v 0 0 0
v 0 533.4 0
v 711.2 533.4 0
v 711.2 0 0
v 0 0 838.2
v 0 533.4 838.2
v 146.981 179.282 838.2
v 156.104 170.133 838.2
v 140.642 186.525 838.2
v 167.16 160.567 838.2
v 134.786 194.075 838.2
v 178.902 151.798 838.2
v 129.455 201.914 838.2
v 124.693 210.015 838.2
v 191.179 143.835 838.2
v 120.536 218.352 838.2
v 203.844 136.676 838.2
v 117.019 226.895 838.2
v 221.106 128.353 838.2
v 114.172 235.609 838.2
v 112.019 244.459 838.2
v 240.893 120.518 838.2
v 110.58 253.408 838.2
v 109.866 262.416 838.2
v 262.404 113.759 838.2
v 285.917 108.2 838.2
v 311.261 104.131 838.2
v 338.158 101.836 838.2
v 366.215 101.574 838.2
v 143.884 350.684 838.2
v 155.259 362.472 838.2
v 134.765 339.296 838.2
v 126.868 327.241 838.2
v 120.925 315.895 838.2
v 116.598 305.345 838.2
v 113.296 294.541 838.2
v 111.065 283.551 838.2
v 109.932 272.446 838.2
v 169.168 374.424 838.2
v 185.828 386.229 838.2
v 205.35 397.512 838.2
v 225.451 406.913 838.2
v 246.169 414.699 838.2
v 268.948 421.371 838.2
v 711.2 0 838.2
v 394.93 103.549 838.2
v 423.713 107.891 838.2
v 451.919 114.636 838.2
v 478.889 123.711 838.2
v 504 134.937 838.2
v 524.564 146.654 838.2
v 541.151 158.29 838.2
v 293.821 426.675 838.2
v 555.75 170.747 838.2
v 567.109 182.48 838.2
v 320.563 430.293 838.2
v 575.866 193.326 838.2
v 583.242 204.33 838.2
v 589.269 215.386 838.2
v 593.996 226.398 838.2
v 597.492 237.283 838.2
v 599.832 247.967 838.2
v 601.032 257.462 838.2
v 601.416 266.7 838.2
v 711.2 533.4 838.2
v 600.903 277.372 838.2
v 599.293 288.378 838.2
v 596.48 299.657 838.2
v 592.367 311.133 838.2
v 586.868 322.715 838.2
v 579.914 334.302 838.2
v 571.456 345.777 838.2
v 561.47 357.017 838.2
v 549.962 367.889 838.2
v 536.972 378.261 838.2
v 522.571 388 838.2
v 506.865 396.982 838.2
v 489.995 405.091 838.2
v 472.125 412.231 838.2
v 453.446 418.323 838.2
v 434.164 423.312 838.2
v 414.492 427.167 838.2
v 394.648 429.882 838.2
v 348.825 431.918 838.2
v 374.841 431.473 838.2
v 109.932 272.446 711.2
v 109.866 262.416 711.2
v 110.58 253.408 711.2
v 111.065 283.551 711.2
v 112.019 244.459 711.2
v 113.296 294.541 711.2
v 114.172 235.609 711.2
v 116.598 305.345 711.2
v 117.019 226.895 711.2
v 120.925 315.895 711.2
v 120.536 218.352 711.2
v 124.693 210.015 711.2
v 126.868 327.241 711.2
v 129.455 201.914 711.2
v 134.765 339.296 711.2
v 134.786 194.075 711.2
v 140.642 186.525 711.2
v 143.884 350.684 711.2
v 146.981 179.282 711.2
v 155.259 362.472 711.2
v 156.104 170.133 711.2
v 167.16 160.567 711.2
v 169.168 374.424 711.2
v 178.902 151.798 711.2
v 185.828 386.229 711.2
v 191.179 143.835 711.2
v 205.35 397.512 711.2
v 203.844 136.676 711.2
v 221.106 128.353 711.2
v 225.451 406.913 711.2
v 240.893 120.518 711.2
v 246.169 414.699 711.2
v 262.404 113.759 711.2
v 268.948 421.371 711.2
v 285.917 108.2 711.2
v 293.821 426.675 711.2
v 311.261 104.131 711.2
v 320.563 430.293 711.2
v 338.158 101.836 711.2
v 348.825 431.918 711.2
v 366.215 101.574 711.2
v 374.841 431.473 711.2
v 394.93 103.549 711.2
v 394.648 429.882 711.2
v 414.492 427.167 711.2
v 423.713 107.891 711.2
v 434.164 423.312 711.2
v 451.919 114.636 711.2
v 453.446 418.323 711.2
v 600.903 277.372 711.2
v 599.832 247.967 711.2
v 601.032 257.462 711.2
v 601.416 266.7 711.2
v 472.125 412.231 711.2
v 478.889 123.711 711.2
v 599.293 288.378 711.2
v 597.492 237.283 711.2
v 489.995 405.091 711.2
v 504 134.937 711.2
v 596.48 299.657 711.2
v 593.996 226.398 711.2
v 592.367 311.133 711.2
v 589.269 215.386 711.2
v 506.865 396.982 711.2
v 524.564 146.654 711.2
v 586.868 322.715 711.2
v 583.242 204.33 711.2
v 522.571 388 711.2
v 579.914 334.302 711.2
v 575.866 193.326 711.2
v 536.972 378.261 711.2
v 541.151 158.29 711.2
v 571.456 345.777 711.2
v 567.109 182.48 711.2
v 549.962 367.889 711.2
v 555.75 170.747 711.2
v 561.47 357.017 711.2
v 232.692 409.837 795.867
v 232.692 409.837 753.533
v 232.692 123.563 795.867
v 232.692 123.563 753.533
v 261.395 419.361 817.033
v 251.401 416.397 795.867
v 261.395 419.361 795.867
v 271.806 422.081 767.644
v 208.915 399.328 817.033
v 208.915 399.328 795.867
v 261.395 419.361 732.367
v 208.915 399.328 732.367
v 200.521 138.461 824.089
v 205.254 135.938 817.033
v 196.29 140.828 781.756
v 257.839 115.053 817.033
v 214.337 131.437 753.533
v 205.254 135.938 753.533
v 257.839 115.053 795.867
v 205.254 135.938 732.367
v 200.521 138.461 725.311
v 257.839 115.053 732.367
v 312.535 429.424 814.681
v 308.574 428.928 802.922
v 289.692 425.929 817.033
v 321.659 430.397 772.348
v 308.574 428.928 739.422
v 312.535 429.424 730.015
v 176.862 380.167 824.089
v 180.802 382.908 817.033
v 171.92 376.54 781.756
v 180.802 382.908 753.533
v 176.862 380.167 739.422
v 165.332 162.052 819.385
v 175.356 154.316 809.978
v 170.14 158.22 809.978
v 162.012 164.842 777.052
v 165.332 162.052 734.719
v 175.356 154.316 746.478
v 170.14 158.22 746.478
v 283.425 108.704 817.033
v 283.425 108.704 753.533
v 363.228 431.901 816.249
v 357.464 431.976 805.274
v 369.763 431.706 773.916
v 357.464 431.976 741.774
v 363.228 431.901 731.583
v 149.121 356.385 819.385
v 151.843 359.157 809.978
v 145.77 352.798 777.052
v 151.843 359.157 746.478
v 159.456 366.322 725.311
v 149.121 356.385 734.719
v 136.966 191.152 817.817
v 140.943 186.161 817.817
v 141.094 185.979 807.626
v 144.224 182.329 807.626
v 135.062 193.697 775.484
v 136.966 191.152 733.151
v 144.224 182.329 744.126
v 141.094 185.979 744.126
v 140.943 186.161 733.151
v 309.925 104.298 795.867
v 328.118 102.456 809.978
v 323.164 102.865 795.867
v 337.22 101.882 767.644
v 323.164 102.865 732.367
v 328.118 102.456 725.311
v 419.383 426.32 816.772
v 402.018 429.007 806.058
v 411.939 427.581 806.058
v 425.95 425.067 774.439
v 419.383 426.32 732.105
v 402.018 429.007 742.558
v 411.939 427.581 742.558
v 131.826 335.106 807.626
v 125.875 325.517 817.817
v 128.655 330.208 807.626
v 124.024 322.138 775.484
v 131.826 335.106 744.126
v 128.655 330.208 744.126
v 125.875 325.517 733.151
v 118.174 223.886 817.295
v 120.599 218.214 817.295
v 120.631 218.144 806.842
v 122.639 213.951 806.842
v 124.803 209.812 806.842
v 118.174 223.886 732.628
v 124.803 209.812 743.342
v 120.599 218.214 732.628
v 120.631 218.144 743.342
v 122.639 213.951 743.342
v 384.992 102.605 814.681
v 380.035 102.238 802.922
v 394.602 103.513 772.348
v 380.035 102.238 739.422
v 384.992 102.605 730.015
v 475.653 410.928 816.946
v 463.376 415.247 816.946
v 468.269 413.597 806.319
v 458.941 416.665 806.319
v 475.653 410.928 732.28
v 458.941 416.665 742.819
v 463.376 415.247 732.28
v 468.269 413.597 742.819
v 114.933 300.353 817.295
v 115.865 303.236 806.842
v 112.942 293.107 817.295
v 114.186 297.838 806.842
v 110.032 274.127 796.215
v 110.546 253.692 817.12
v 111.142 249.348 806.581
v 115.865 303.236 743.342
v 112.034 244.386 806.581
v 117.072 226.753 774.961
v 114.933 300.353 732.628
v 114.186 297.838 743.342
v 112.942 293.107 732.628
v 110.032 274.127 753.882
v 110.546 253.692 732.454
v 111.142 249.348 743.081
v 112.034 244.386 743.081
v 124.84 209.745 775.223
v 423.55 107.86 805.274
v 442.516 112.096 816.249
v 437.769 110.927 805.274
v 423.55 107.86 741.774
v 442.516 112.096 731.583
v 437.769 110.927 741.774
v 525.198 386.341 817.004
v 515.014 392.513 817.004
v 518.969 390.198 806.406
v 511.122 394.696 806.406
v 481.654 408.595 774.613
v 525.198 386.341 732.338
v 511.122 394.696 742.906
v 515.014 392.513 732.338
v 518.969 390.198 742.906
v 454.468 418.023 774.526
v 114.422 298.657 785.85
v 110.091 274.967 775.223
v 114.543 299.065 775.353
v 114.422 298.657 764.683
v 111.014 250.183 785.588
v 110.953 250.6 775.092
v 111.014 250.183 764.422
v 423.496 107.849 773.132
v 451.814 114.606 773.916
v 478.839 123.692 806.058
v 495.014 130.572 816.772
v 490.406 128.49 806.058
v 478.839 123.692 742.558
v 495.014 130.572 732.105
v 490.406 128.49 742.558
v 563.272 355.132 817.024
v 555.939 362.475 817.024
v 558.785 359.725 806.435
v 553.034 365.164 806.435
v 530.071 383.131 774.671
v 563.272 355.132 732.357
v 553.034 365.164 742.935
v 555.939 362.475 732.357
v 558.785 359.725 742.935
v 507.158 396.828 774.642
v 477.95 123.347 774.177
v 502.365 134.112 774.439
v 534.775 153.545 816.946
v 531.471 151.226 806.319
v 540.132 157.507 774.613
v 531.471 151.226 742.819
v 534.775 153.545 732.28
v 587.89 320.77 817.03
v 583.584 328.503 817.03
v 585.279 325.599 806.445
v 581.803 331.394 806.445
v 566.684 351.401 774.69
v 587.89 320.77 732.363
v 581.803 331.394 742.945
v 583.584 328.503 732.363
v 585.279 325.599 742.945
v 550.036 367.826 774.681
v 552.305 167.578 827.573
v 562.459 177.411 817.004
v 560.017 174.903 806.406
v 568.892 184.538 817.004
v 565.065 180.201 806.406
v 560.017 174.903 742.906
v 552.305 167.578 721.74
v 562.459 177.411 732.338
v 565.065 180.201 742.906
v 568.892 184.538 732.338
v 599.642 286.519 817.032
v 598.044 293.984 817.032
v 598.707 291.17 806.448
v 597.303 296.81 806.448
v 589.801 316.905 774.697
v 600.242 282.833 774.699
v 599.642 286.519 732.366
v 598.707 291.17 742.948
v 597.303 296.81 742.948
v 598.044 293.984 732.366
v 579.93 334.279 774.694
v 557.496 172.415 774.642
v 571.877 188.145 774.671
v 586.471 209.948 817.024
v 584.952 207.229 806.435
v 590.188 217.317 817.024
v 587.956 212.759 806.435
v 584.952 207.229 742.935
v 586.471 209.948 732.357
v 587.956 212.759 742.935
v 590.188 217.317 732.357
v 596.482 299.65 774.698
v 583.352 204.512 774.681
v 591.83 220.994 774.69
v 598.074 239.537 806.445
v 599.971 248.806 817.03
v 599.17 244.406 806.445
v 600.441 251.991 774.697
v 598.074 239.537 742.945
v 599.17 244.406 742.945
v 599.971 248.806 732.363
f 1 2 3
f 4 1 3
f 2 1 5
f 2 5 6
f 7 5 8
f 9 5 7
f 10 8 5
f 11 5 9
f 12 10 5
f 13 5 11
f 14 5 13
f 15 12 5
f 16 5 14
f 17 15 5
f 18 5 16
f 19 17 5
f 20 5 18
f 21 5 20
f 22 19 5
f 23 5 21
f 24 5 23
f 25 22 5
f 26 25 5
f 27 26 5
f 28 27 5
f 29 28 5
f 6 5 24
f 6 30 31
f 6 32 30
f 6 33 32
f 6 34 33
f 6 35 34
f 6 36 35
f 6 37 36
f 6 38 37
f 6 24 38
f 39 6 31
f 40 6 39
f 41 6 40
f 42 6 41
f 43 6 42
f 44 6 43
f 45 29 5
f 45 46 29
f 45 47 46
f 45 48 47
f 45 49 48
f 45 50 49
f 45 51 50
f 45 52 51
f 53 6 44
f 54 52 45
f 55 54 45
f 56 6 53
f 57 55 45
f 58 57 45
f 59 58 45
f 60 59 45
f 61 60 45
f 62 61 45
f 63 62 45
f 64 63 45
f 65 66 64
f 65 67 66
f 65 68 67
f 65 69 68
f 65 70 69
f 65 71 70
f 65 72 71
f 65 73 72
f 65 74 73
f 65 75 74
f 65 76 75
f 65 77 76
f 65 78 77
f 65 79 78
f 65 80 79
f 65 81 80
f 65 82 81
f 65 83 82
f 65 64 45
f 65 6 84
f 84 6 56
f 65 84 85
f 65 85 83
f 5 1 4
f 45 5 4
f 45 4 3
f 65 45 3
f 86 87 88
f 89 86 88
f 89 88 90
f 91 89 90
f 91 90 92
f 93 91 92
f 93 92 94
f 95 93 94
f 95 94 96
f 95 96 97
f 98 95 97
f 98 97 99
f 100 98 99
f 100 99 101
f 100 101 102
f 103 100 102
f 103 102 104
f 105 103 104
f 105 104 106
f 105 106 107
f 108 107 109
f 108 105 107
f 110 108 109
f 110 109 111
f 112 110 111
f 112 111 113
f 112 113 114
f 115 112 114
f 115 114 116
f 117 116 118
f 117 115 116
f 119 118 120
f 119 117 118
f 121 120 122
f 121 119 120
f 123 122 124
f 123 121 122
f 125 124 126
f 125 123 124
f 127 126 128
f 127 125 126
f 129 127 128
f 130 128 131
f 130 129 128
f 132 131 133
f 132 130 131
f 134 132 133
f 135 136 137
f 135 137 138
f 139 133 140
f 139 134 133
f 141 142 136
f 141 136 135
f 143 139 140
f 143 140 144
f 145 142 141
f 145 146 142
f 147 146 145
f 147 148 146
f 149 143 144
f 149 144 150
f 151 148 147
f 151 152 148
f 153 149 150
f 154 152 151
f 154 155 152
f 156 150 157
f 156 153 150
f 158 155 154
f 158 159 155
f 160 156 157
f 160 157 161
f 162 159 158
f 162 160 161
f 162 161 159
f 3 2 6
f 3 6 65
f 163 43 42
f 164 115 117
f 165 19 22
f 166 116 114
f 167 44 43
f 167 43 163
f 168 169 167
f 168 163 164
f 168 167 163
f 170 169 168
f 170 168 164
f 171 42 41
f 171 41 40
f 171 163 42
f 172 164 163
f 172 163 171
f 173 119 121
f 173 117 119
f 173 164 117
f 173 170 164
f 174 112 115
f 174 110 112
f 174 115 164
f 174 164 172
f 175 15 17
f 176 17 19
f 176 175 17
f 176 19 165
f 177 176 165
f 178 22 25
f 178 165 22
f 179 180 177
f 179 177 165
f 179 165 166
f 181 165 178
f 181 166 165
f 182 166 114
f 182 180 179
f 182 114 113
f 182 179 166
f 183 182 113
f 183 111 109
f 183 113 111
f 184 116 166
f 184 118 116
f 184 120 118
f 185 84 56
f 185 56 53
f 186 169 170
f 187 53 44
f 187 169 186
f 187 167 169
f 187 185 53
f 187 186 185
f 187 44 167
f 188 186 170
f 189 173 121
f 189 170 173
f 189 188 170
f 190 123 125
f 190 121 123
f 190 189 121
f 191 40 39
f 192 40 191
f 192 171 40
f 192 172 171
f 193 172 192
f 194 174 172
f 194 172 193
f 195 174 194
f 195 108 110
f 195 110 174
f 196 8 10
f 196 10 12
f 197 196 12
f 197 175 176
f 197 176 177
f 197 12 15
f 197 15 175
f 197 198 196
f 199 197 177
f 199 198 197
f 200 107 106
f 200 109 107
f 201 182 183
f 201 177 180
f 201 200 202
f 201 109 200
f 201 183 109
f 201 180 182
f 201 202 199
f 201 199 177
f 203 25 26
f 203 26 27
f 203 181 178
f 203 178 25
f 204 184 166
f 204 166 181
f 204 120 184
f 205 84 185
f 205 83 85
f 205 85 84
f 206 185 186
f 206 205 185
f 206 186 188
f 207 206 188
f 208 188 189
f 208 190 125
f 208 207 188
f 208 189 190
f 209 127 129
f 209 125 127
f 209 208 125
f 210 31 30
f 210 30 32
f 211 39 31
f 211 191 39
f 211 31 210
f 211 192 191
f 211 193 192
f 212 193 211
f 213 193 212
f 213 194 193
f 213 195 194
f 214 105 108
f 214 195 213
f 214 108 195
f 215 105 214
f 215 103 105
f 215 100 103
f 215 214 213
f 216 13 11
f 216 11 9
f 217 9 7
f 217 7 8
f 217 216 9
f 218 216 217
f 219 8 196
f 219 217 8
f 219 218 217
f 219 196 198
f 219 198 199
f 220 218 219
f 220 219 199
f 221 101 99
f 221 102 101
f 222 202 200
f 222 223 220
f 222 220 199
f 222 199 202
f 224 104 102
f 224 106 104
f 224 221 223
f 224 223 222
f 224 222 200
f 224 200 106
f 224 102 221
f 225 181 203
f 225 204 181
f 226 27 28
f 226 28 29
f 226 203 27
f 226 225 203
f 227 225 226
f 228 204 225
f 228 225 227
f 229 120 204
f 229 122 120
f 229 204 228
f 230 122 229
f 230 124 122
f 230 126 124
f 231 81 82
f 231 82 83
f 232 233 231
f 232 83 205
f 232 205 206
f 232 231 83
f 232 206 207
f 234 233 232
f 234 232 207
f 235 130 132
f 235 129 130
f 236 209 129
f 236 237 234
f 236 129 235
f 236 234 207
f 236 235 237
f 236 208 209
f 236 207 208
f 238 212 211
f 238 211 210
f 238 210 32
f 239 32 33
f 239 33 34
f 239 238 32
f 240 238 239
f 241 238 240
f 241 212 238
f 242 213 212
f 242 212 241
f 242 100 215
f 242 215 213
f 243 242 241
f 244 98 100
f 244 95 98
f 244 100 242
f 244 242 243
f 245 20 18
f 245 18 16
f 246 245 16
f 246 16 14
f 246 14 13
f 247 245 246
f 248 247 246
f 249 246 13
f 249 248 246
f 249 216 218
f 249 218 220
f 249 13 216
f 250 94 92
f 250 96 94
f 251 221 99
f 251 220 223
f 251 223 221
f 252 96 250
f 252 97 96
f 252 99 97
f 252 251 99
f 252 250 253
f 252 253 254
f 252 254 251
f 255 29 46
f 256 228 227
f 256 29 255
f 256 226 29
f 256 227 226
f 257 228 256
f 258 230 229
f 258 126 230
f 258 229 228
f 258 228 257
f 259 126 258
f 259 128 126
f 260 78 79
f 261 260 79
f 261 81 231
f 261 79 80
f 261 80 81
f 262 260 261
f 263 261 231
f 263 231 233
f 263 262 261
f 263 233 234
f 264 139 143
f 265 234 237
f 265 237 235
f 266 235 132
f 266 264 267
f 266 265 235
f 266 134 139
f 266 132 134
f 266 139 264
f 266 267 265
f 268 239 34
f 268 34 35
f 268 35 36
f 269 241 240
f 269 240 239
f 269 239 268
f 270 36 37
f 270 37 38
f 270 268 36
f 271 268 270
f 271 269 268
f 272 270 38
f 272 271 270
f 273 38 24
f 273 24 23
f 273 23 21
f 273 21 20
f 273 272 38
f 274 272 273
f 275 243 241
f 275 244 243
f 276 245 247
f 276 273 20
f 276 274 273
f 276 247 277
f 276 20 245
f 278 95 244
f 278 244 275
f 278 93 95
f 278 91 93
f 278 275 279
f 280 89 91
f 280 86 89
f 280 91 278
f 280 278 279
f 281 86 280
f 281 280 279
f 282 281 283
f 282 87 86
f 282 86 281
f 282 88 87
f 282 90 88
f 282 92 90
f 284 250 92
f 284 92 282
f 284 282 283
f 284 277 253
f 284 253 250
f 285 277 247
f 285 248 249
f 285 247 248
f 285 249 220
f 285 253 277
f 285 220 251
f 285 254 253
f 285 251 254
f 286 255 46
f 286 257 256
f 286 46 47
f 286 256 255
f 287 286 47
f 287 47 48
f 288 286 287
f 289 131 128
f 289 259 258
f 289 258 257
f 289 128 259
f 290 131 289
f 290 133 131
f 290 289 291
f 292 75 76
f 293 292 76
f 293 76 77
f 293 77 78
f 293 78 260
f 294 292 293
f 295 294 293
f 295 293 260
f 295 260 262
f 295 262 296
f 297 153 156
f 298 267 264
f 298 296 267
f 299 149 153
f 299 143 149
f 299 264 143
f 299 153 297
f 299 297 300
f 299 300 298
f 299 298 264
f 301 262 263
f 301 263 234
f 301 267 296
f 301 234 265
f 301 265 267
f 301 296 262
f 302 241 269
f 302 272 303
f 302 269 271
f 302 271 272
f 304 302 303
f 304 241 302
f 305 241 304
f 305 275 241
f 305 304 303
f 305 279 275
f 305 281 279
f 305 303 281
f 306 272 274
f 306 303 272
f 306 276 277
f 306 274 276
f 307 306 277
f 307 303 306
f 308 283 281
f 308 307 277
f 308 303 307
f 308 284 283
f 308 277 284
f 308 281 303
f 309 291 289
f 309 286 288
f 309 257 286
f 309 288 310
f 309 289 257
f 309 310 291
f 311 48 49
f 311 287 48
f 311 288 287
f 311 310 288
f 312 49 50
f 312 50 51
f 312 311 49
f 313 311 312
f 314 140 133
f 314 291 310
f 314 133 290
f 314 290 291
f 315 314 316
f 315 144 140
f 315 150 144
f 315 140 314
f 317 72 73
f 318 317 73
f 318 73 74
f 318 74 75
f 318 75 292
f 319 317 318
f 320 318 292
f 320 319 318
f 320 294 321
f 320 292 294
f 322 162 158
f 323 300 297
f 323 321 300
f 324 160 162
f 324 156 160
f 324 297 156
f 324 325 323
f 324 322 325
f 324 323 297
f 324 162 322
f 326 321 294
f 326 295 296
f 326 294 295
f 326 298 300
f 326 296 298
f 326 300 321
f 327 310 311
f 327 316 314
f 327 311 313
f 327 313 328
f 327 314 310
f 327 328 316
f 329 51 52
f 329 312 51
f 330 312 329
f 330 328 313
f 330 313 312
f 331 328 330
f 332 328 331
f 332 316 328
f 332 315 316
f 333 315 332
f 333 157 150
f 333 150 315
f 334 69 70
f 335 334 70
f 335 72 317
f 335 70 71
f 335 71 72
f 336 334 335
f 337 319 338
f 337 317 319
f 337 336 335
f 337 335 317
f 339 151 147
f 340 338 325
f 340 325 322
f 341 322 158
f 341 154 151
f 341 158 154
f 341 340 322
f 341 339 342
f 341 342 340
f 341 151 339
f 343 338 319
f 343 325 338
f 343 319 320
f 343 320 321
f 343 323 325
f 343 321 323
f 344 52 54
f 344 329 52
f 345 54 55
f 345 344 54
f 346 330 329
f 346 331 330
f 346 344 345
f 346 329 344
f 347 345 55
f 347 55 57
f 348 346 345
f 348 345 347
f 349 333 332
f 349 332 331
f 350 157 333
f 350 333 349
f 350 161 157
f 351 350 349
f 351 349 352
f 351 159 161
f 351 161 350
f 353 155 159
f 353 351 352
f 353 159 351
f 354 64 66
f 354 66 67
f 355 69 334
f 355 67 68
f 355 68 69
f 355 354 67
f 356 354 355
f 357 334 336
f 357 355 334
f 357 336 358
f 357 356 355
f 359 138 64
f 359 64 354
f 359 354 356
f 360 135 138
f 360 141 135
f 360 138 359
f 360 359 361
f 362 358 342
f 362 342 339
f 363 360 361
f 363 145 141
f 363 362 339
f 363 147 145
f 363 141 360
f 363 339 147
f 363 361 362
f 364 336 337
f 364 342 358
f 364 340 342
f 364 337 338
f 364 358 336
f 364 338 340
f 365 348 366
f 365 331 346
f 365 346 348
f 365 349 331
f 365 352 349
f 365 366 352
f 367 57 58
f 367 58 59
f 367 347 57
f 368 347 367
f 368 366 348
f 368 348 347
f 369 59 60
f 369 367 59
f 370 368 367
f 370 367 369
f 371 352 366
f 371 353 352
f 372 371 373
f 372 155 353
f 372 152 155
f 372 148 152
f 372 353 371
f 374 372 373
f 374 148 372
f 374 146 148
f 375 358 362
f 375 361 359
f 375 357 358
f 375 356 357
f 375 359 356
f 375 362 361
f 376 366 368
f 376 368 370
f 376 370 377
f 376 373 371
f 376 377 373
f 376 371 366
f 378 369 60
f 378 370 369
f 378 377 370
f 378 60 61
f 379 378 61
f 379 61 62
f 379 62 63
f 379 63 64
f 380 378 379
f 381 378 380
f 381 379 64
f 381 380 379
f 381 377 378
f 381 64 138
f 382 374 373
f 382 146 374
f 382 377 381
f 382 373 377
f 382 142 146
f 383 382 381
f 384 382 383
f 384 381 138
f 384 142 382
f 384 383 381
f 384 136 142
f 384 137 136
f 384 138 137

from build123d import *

# Parameters (mm, degrees)
F0_W     = 711.2
F0_H     = 533.4
F1_DEPTH = 838.2
F2_DEPTH = 711.2


with BuildPart() as f1:
    # F0 (on Top) → F1 (new body)
    with BuildSketch(Plane.XY):
        with Locations((355.6, 266.7)):
            Rectangle(F0_W, F0_H)
        with BuildLine():
            add(Edge.make_bspline(
                [(601.416213, 266.7), (601.416213, 552.973976), (232.691893, 409.836988), (-136.032426, 266.7), (232.691893, 123.563012), (601.416213, -19.573976), (601.416213, 266.7)],
                knots=[0, 0, 0, 2.094395, 2.094395, 4.18879, 4.18879, 6.283185, 6.283185, 6.283185], degree=2, weights=[1, 0.5, 1, 0.5, 1, 0.5, 1]))
        make_face(mode=Mode.SUBTRACT)
    extrude(amount=F1_DEPTH)

    # F0 (on Top) → F2 (join)
    with BuildSketch(Plane.XY):
        with BuildLine():
            add(Edge.make_bspline(
                [(601.416213, 266.7), (601.416213, 552.973976), (232.691893, 409.836988), (-136.032426, 266.7), (232.691893, 123.563012), (601.416213, -19.573976), (601.416213, 266.7)],
                knots=[0, 0, 0, 2.094395, 2.094395, 4.18879, 4.18879, 6.283185, 6.283185, 6.283185], degree=2, weights=[1, 0.5, 1, 0.5, 1, 0.5, 1]))
        make_face()
    extrude(amount=F2_DEPTH)


solid = f1.part
